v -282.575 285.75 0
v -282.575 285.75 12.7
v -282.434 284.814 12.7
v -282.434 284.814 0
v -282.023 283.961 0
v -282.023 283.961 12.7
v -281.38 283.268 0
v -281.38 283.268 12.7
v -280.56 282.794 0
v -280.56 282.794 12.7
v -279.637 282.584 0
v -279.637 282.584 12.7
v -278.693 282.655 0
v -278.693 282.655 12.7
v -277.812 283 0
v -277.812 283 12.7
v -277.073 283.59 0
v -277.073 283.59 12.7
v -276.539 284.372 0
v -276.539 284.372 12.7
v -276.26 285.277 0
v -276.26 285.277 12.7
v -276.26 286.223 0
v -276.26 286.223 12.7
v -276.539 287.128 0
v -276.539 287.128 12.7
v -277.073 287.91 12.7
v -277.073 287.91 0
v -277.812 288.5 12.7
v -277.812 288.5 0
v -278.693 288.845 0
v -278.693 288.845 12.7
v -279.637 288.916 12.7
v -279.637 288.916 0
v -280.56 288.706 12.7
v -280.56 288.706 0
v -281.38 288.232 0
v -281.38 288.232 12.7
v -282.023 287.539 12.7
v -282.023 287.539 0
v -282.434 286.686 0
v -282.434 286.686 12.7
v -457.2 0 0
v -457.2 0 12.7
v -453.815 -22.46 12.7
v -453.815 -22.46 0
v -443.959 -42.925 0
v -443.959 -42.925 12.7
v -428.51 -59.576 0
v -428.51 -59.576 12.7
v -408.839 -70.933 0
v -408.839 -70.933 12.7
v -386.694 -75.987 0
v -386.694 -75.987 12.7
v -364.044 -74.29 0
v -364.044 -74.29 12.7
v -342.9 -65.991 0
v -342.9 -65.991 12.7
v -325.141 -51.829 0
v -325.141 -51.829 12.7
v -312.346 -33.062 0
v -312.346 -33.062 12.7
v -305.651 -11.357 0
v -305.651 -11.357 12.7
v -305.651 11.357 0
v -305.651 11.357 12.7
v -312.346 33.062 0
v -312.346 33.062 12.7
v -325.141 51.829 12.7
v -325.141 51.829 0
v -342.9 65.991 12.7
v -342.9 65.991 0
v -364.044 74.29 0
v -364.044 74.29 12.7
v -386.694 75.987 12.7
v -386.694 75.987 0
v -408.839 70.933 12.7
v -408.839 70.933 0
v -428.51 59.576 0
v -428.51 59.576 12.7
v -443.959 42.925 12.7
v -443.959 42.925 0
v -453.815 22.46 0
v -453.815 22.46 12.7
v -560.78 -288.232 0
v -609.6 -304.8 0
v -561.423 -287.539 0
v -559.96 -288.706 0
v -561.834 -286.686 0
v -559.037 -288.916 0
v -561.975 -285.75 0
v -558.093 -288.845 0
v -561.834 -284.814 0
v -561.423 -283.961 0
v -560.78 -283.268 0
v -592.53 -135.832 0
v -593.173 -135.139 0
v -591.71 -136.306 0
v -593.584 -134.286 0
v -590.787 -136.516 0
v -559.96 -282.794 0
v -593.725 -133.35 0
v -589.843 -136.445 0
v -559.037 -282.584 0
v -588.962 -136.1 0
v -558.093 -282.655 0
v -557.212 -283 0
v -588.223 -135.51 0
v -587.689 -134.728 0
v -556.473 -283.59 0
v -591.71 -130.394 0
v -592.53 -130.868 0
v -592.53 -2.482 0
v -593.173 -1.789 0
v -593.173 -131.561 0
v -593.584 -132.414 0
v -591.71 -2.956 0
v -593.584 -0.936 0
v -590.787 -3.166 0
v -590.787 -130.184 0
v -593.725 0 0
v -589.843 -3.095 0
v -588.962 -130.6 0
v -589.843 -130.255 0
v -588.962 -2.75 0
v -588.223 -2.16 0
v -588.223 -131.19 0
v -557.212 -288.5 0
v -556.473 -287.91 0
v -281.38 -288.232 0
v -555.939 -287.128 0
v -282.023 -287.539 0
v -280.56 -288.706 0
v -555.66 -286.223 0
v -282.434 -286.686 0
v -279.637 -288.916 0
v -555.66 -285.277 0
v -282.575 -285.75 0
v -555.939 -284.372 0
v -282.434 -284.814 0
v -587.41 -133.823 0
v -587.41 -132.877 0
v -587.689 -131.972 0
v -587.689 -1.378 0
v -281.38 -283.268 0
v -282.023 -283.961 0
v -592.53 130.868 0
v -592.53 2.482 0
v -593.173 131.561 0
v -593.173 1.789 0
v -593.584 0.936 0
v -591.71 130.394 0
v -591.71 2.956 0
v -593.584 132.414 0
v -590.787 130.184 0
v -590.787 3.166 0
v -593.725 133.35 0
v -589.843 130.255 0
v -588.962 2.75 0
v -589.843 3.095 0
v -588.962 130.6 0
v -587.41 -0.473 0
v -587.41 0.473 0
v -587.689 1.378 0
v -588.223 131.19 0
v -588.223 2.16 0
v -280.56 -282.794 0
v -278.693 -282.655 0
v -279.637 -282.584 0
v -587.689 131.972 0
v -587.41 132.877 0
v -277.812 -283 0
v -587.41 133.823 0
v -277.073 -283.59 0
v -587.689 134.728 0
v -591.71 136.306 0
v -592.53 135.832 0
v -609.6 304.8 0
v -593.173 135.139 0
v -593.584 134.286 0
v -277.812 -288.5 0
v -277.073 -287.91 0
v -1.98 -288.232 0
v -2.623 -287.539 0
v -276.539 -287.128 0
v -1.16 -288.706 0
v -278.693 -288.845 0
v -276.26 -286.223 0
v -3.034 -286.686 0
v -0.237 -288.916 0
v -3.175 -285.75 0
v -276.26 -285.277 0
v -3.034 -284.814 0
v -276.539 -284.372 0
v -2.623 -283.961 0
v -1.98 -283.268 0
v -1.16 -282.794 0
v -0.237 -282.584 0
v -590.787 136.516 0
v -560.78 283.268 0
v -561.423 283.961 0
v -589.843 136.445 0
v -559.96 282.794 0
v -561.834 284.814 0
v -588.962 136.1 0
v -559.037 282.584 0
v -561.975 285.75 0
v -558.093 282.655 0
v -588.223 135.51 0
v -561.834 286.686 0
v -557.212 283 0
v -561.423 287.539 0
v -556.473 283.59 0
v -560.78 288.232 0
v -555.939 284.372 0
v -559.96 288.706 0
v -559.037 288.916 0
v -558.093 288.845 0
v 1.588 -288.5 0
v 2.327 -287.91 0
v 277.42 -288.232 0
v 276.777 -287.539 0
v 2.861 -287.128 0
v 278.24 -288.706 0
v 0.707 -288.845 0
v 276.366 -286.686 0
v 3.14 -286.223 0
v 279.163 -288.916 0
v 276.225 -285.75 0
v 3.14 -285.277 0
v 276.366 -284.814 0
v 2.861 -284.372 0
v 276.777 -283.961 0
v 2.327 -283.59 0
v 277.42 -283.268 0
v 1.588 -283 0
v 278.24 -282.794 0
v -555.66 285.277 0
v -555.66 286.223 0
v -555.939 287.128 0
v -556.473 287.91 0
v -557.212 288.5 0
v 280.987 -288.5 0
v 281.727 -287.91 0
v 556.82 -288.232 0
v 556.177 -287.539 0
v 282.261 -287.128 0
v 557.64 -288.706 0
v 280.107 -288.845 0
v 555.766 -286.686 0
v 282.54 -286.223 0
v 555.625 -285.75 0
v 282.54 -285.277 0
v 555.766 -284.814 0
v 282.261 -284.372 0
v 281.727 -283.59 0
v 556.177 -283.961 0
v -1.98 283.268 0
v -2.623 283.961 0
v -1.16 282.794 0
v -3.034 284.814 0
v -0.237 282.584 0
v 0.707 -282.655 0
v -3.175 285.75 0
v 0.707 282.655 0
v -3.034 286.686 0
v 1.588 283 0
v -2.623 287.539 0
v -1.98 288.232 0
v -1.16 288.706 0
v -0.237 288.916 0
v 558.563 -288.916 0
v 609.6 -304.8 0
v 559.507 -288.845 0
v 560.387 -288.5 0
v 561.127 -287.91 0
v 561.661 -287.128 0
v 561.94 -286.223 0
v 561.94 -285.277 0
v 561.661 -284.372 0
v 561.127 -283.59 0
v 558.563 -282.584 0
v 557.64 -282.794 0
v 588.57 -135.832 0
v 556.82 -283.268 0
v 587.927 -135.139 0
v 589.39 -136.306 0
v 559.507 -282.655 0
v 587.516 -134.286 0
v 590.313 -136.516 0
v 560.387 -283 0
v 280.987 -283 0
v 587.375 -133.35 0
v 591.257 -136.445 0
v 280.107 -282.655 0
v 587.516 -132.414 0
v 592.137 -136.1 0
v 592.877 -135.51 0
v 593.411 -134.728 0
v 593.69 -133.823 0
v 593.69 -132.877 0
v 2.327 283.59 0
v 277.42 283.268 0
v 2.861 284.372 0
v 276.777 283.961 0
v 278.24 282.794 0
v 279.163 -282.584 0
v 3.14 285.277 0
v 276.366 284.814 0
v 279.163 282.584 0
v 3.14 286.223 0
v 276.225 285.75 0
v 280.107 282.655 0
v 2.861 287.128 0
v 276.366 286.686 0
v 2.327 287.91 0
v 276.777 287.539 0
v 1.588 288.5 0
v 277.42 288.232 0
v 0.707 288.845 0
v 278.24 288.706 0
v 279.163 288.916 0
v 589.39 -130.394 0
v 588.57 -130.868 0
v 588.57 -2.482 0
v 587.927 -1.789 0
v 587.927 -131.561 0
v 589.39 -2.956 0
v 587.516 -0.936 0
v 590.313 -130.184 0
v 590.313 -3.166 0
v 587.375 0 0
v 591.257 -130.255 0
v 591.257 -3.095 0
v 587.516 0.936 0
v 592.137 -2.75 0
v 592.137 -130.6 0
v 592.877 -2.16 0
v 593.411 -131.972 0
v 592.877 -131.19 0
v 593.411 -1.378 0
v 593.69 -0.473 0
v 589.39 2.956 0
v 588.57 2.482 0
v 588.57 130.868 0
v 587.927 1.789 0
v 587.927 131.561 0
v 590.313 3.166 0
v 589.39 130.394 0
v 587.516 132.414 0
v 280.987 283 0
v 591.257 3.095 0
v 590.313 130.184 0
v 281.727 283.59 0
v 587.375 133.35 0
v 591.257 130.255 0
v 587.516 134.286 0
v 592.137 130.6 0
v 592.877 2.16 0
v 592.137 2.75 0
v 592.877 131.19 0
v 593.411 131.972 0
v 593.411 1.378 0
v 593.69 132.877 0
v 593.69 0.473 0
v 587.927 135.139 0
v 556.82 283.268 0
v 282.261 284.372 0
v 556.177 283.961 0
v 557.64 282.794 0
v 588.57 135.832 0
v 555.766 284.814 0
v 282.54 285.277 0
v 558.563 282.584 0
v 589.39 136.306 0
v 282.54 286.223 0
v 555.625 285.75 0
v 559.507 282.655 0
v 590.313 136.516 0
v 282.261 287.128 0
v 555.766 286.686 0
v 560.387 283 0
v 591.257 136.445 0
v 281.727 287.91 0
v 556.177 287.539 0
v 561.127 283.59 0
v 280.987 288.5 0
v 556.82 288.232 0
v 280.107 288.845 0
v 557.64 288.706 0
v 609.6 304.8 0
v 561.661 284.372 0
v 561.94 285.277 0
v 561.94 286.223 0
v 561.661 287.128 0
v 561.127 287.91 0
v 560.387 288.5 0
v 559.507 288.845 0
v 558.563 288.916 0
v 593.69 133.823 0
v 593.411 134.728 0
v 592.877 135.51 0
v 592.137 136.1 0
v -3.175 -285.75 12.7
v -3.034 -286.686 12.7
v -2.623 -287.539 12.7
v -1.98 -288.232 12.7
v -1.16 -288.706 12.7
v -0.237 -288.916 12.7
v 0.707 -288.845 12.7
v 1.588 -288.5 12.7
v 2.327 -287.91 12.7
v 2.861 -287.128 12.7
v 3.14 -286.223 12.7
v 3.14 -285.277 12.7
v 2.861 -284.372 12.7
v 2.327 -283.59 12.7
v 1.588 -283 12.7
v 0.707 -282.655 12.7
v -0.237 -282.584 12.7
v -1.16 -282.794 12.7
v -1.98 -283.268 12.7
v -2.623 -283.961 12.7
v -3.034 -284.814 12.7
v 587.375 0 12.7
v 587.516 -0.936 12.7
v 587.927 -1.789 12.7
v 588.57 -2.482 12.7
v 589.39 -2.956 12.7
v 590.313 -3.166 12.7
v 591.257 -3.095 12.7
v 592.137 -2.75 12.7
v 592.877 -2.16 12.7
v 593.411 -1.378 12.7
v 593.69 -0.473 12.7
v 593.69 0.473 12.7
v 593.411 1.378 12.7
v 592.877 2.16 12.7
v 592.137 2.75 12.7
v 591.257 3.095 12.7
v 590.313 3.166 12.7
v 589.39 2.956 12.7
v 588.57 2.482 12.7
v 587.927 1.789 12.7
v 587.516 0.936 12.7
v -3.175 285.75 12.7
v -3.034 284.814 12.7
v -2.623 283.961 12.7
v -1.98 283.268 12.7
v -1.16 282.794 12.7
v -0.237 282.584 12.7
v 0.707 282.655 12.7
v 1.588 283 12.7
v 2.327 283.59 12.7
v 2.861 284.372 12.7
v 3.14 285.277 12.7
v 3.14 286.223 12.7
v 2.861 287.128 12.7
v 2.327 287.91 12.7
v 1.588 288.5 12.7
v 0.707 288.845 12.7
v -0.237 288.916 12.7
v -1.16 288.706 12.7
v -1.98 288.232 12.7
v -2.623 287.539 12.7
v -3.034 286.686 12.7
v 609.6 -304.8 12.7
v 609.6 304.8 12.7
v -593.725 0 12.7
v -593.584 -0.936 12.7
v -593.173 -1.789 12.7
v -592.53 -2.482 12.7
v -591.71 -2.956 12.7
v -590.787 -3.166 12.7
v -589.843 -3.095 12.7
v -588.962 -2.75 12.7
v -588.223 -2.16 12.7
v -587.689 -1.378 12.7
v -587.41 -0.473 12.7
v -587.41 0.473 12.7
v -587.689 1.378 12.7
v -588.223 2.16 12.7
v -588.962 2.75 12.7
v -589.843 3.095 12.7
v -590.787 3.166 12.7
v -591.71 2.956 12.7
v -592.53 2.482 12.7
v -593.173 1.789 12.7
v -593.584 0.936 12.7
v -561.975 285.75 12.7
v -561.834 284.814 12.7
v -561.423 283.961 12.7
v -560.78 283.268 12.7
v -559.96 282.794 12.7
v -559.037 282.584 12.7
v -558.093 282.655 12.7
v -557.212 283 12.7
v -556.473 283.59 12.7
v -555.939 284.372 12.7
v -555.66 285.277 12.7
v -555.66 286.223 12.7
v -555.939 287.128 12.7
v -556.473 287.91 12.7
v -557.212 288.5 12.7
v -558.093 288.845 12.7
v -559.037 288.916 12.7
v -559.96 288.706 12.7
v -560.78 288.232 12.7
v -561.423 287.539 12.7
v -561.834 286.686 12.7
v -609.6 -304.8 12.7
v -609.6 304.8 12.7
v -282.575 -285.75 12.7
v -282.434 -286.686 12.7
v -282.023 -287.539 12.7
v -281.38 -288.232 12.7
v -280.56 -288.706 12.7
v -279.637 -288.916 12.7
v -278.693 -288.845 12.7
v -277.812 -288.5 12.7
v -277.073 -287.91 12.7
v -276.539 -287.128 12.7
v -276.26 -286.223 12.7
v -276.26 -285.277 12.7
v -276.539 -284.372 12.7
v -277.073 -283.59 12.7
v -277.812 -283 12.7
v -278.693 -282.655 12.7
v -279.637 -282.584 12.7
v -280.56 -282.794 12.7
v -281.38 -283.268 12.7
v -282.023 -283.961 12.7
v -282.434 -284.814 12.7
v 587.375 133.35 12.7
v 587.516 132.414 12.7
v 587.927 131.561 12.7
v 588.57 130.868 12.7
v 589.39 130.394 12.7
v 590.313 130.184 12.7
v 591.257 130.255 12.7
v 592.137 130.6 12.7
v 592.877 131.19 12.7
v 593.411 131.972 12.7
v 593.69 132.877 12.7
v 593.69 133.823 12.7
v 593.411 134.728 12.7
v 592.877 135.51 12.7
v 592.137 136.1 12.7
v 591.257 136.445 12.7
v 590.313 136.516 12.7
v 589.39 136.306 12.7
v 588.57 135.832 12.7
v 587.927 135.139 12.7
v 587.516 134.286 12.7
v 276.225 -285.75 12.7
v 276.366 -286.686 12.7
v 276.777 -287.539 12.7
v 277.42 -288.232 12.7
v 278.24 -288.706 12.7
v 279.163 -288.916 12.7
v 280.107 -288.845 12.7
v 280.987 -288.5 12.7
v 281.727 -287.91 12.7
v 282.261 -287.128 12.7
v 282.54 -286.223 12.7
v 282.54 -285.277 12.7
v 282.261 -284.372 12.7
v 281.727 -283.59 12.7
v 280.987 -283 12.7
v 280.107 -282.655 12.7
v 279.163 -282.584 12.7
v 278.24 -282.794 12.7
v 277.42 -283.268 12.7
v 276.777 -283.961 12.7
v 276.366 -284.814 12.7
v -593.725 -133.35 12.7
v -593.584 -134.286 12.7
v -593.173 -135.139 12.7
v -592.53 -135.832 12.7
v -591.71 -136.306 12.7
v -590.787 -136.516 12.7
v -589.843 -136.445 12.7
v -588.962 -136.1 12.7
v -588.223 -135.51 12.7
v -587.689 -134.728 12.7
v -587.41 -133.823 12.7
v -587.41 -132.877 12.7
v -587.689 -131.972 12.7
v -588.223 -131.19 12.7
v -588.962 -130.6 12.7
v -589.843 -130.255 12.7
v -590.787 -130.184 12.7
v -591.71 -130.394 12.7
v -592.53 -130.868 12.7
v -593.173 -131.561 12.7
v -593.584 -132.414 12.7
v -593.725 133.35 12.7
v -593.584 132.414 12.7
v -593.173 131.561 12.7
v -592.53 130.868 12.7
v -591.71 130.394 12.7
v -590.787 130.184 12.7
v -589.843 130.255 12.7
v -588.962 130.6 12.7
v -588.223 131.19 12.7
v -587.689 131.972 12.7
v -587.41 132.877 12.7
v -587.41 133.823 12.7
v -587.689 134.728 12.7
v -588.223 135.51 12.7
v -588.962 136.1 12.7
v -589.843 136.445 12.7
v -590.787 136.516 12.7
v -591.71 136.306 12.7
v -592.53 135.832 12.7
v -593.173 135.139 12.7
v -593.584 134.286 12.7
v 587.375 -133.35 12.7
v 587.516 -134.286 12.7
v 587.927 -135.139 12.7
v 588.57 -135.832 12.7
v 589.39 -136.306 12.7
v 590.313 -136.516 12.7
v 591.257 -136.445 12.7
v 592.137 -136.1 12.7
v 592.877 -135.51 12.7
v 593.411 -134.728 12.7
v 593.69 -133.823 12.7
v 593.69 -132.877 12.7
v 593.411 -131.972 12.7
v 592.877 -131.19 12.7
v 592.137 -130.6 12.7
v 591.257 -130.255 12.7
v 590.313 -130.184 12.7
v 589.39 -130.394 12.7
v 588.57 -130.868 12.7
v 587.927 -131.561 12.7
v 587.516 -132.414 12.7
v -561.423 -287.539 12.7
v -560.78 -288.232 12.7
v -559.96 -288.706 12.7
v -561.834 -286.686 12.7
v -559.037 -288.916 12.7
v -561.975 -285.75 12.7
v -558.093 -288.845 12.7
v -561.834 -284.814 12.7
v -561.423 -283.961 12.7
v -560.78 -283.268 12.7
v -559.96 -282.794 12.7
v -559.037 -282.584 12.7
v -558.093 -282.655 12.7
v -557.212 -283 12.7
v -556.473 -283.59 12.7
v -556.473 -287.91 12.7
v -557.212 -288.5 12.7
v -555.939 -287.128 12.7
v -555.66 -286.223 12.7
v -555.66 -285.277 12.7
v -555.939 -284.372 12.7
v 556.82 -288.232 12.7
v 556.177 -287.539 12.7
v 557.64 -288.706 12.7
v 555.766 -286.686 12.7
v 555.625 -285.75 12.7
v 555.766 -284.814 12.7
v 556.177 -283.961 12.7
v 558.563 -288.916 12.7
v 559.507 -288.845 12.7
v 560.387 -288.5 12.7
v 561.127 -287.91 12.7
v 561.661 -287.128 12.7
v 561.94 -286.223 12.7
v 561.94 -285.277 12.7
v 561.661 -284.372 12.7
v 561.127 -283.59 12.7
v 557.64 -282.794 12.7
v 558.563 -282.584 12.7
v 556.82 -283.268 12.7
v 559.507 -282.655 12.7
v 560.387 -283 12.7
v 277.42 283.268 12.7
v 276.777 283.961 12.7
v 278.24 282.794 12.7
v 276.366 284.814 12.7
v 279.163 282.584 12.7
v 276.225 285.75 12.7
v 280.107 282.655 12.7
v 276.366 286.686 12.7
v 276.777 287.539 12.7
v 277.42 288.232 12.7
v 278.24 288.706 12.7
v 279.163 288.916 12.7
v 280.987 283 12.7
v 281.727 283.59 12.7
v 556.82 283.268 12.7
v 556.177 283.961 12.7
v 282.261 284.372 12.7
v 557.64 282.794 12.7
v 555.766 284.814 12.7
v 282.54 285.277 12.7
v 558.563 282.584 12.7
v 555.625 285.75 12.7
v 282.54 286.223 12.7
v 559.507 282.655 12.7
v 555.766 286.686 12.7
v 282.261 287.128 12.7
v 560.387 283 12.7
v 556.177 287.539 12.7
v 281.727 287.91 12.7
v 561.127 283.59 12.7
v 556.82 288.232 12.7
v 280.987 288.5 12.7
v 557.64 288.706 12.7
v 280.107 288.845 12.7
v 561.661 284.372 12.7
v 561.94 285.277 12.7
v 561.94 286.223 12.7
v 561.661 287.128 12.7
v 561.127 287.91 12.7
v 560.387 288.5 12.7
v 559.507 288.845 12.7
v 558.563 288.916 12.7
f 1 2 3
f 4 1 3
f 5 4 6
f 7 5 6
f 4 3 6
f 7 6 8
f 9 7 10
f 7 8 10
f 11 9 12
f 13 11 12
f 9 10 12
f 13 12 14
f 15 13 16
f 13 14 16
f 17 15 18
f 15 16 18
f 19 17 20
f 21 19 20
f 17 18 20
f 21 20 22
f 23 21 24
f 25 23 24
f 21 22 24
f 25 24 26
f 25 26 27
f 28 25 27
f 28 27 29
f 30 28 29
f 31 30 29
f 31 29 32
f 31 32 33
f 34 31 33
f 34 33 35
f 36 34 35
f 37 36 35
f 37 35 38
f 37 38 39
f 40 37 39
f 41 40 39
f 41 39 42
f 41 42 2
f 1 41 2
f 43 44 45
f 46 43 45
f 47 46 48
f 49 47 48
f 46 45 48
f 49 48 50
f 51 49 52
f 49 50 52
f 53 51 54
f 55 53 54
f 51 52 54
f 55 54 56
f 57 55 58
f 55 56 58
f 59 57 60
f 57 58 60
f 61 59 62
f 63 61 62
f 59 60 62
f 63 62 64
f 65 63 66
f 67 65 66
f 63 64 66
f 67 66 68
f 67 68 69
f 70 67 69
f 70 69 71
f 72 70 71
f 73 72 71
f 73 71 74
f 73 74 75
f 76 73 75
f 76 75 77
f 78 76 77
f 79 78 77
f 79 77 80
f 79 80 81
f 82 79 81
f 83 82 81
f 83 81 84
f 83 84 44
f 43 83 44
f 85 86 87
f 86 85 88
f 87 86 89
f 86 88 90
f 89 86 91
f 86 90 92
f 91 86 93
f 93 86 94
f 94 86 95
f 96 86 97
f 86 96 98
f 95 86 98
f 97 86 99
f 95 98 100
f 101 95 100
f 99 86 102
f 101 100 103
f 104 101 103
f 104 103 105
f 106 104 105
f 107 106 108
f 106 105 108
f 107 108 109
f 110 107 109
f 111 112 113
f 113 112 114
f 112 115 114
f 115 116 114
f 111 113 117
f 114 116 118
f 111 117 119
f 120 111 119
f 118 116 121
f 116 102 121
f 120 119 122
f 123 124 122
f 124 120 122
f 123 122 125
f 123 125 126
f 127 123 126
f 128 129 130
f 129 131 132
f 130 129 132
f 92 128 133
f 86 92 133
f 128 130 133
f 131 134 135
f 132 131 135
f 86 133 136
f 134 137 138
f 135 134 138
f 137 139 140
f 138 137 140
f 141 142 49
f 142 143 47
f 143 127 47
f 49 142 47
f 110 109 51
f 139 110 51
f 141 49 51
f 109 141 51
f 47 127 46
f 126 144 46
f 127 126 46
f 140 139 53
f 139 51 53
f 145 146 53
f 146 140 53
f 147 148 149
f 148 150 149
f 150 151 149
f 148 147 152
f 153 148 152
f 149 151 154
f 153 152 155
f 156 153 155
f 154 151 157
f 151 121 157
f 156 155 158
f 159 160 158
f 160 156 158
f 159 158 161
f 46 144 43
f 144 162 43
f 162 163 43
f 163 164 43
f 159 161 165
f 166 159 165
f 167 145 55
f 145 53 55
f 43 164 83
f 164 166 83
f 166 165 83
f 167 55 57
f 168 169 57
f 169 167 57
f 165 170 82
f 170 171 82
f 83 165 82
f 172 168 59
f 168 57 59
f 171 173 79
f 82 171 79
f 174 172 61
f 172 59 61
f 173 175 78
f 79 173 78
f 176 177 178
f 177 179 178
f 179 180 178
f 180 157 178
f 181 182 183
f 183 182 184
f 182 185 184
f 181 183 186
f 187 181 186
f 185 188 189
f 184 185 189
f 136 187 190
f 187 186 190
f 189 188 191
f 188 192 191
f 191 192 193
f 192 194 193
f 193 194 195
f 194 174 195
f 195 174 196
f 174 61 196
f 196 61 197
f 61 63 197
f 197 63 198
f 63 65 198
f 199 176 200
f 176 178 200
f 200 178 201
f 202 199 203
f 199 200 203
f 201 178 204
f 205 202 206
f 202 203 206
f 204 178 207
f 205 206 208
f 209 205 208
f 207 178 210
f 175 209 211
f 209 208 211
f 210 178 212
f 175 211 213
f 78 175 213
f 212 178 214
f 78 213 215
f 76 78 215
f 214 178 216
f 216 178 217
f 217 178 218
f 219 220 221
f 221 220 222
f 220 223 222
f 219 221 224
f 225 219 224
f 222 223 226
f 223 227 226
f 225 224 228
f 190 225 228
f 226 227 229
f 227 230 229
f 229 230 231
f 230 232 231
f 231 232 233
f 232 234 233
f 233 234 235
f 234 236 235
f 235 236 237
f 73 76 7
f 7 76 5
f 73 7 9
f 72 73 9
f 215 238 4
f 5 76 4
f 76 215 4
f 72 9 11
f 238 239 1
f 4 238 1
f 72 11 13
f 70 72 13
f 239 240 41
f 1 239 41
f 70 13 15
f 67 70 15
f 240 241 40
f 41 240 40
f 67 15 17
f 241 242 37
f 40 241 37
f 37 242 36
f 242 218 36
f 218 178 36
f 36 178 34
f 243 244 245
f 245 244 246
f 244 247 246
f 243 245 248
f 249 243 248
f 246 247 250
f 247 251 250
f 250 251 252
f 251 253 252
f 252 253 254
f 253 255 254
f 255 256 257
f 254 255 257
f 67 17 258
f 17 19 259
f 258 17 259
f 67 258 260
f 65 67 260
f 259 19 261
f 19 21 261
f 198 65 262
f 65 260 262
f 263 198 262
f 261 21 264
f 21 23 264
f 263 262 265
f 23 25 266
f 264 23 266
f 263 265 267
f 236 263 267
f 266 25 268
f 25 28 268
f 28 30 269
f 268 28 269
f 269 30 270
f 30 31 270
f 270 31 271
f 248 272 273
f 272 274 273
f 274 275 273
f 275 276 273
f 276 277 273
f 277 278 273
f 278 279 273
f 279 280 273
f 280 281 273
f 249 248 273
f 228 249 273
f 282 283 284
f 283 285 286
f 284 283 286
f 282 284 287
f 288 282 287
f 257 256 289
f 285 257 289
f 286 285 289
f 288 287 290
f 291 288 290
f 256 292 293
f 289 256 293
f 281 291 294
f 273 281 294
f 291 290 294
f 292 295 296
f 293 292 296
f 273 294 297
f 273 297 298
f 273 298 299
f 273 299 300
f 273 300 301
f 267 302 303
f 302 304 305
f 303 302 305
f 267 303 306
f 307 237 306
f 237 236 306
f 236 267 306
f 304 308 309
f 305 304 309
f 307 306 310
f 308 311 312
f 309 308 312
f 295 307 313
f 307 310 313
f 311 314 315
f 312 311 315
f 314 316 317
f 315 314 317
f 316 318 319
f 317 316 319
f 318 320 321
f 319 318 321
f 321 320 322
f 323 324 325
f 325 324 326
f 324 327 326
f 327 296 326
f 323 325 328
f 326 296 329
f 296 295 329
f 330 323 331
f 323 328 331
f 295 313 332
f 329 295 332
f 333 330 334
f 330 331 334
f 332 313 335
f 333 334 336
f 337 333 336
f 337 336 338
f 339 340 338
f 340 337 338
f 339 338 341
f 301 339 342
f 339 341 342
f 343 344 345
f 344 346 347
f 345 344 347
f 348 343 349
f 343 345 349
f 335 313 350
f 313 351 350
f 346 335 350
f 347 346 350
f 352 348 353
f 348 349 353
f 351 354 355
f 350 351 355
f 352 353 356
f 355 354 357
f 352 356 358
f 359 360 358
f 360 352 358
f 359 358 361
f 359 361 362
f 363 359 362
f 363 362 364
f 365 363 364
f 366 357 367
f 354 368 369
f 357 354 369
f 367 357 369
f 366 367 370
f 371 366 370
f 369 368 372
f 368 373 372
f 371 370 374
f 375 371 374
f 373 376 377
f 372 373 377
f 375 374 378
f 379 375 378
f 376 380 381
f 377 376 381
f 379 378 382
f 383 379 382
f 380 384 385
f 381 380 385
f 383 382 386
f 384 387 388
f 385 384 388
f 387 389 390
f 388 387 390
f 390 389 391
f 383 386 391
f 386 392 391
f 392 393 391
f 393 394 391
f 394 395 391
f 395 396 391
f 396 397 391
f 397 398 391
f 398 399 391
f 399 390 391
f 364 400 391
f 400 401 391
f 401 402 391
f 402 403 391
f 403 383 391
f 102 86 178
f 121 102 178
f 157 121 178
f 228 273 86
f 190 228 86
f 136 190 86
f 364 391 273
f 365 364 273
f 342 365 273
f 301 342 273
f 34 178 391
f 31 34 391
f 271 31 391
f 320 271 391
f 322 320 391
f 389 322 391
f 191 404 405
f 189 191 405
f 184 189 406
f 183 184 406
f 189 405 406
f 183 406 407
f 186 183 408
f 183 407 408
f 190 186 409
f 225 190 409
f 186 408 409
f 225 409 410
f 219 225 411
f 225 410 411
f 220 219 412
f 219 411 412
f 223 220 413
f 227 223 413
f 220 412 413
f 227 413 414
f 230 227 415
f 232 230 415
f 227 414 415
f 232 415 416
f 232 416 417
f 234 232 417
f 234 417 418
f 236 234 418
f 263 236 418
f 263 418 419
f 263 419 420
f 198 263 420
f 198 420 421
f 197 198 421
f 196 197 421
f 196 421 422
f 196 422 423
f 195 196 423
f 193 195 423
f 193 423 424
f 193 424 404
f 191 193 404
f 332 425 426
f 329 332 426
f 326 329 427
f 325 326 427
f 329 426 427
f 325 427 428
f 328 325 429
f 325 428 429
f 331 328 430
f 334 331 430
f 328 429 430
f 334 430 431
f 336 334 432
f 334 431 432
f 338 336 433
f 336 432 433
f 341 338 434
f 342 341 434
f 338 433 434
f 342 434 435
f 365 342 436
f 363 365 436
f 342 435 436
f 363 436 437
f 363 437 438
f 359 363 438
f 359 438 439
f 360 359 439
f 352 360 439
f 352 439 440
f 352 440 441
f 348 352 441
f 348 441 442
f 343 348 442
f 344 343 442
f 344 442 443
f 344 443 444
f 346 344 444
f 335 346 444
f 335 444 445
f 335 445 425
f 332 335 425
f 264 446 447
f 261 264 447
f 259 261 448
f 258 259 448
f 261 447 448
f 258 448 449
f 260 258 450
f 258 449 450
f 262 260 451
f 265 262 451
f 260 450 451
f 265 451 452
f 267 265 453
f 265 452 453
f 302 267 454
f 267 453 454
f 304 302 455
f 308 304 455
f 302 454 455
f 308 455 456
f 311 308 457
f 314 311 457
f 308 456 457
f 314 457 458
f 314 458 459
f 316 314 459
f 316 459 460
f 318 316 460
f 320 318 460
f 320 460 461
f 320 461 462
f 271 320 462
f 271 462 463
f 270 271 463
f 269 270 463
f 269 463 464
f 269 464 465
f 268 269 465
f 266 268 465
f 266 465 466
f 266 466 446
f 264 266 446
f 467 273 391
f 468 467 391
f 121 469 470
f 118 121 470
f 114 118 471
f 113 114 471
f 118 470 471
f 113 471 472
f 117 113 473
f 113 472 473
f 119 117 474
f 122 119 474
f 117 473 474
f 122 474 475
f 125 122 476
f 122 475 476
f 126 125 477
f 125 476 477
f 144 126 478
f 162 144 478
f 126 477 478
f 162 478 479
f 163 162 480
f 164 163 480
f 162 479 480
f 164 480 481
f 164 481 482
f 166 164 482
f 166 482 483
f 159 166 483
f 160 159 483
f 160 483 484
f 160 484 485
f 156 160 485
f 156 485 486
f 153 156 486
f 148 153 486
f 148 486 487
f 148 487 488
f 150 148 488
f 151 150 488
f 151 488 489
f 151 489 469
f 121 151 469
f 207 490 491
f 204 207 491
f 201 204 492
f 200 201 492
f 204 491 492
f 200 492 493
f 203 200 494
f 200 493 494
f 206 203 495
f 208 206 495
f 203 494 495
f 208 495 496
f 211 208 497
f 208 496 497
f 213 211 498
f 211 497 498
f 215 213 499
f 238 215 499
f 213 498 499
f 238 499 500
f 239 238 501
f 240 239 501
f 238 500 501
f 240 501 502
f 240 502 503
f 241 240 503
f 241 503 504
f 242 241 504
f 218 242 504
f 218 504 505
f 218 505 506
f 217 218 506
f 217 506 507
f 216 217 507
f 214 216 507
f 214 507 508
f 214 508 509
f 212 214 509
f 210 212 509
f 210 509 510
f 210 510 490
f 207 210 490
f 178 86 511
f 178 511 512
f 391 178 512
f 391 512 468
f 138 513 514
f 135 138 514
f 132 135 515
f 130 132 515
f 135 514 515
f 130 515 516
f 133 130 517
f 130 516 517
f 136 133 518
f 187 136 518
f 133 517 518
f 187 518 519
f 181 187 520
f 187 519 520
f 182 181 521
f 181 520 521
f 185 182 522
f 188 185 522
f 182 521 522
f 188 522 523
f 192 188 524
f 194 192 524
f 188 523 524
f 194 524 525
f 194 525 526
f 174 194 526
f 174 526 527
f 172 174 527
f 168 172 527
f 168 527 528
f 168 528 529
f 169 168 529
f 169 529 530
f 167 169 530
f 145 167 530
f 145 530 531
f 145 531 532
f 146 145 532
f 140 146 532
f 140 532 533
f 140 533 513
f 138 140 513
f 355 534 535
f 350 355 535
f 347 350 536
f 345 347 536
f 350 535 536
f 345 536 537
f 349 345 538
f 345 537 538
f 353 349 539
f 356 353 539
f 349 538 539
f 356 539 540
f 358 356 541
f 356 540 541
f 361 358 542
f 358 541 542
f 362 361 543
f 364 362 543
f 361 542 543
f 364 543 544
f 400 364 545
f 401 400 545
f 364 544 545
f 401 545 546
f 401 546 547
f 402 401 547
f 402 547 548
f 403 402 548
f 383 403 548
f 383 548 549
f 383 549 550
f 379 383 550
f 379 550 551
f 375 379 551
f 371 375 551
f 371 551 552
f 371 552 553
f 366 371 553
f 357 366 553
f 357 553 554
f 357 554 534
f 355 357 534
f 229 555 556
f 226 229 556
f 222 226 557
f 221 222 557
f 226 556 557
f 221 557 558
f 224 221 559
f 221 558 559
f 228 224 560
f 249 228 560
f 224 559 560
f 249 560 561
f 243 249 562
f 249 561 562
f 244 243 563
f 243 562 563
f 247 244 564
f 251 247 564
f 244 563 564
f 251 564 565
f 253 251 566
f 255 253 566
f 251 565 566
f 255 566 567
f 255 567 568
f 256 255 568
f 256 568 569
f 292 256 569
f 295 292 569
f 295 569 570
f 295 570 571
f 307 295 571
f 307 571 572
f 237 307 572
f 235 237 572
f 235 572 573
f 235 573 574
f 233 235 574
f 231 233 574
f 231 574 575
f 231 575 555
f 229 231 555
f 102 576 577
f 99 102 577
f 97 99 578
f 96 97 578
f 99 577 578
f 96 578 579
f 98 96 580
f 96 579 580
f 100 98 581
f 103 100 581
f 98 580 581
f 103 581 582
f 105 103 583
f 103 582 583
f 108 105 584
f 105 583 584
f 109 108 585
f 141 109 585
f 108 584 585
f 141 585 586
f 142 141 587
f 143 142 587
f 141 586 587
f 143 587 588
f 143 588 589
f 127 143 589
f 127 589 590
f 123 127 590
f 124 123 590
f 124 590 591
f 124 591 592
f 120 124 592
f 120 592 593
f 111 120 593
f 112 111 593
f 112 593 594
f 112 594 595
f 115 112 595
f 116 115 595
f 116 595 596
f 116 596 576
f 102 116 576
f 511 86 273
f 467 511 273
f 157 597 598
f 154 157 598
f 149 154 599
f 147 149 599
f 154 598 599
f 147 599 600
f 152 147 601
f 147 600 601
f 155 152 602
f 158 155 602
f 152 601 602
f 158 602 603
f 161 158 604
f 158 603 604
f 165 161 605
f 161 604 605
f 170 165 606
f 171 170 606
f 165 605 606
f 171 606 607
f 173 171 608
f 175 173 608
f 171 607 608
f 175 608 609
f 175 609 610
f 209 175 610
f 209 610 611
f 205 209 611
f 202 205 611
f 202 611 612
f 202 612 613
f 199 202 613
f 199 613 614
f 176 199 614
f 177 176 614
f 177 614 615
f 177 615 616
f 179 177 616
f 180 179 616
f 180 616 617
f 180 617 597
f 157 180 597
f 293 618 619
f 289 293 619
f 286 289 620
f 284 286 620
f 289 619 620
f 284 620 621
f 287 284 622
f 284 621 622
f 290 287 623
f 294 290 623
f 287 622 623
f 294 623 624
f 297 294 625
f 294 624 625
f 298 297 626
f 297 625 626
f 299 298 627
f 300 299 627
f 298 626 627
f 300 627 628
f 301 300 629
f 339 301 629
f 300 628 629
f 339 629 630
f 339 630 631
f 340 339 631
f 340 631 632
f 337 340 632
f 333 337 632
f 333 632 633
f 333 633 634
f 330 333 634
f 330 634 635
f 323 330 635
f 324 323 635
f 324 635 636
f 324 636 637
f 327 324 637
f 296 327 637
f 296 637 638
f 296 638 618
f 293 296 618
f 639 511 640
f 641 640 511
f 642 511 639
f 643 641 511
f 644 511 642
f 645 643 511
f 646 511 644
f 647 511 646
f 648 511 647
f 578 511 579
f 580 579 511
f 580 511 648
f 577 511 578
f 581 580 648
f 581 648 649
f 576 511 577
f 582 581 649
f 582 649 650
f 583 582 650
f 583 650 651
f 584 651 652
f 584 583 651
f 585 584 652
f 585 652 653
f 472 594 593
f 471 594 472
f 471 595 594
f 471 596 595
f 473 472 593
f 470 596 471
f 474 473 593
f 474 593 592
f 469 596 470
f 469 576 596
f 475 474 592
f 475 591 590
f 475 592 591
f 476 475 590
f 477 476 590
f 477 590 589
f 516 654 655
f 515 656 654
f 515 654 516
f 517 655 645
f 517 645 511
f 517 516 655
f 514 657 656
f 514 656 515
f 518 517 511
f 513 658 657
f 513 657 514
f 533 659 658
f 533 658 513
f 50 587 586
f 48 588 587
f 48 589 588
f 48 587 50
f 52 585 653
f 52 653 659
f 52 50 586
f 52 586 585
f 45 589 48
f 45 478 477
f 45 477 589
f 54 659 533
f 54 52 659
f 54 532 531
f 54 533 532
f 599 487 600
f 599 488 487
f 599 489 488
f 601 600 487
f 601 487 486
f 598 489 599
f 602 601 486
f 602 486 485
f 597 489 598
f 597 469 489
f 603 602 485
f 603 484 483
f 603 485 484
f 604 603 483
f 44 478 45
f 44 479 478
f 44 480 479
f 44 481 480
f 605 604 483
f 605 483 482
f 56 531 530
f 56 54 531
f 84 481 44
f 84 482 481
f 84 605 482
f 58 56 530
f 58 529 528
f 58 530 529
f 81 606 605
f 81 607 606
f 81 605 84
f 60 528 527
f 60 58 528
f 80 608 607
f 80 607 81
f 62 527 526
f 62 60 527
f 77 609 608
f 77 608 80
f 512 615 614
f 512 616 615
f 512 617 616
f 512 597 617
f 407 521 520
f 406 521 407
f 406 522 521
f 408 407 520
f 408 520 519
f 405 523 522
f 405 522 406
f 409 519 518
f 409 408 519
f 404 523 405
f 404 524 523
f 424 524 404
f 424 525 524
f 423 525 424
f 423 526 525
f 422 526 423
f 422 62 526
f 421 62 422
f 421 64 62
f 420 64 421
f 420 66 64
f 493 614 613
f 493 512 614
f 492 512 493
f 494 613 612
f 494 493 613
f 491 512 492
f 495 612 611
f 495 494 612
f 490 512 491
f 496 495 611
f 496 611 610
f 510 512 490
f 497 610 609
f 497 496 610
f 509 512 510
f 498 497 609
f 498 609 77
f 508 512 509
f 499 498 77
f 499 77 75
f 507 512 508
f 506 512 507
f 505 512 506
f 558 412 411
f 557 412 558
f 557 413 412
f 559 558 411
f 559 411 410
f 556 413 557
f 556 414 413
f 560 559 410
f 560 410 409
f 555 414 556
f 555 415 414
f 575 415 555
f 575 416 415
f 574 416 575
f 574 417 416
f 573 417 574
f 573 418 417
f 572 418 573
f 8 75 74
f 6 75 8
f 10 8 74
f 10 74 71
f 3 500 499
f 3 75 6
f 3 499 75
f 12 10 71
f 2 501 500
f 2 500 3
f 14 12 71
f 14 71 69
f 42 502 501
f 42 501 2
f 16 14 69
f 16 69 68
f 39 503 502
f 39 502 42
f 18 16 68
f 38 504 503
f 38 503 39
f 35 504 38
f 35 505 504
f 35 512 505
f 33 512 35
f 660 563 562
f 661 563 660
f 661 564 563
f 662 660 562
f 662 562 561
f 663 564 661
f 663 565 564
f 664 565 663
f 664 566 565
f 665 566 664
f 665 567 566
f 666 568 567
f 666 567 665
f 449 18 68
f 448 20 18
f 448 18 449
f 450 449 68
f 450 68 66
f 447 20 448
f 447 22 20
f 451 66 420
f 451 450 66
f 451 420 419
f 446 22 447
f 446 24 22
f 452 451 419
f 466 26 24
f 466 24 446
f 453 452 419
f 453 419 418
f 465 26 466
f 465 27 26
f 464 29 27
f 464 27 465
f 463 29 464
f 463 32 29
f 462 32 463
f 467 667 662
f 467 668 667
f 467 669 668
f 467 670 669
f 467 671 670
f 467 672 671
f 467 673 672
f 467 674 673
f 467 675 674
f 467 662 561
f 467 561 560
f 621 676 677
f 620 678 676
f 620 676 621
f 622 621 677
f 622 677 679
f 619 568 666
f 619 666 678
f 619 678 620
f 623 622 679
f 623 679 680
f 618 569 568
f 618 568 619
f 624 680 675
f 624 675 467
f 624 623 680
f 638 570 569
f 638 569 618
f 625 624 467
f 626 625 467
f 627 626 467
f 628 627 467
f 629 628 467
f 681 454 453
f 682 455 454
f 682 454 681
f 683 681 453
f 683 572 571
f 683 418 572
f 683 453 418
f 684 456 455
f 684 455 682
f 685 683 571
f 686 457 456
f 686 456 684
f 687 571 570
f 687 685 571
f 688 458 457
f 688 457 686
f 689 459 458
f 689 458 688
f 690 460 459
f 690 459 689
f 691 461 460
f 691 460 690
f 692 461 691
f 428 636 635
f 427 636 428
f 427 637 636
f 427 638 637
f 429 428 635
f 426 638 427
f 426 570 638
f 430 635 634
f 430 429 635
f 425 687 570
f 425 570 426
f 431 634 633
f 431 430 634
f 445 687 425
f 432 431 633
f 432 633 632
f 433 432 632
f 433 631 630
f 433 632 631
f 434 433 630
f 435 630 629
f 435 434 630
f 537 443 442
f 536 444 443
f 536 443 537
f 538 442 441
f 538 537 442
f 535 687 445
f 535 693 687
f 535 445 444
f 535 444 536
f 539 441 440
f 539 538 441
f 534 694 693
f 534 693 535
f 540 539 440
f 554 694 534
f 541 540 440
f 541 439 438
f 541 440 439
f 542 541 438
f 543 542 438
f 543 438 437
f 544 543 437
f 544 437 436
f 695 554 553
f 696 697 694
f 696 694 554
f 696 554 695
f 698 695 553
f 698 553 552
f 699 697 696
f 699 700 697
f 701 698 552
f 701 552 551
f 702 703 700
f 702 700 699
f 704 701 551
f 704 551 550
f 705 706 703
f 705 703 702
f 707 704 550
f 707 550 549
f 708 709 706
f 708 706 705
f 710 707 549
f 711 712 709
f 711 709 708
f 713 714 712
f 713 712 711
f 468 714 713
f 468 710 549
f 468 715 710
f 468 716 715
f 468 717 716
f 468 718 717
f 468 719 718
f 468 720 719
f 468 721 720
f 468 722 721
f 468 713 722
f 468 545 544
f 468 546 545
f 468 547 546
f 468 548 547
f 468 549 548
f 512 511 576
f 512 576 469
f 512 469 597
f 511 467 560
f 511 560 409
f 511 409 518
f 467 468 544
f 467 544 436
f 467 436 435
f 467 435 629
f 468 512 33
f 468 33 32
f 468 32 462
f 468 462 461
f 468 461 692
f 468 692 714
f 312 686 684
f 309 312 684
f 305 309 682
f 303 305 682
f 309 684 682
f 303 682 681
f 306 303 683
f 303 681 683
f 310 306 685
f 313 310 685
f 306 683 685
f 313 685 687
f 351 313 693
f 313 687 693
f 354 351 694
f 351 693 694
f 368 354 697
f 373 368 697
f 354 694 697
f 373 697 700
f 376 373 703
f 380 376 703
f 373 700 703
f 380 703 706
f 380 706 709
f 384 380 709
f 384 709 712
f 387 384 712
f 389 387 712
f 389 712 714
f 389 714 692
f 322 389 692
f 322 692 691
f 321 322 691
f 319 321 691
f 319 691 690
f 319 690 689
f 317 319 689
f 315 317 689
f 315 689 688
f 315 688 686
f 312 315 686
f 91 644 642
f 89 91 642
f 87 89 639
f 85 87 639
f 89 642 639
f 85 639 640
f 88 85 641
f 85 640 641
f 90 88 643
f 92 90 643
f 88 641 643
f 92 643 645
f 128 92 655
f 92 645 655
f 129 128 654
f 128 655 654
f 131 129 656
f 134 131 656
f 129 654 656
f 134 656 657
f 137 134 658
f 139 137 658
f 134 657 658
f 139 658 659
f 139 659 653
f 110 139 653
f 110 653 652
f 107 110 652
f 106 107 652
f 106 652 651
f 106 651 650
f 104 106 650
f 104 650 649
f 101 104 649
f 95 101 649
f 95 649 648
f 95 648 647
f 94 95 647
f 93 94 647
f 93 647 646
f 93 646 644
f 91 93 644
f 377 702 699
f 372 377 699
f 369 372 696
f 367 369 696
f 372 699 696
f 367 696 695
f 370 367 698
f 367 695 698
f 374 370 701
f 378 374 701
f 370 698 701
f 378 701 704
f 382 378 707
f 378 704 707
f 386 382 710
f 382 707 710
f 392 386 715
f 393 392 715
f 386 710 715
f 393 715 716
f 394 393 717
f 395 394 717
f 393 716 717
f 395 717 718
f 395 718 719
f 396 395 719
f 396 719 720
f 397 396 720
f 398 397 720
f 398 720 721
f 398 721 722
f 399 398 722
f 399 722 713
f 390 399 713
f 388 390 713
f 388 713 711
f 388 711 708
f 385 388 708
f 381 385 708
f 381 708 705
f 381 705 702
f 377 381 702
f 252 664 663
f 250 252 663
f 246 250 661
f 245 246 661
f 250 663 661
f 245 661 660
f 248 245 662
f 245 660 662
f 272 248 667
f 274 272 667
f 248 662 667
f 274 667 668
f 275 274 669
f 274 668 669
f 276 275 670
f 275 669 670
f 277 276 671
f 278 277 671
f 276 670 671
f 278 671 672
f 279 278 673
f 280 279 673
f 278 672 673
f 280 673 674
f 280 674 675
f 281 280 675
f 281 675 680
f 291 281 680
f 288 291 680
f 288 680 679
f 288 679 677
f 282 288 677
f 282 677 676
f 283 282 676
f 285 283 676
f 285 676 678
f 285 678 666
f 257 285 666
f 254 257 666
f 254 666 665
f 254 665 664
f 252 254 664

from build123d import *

# Parameters (mm, degrees)
F0_W     = 1219.2
F0_H     = 609.6
F1_DEPTH = 12.7
F2_D     = 152.4
F3_D     = 6.35


with BuildPart() as f1:
    # F0 (on Top) → F1 (new body)
    with BuildSketch(Plane.XY):
        Rectangle(F0_W, F0_H)
    extrude(amount=F1_DEPTH)

    # F2 (through all)
    with Locations(Plane(origin=(0, 0, 0), x_dir=(1, 0, 0), z_dir=(0, 0, -1))):
        with Locations((-381, 0)):
            Hole(F2_D / 2)

    # F3 (through all)
    with Locations(Plane(origin=(0, 0, 0), x_dir=(1, 0, 0), z_dir=(0, 0, -1))):
        with Locations((-558.8, 285.75), (-279.4, 285.75), (0, 285.75), (279.4, 285.75), (558.8, 285.75), (558.8, -285.75), (279.4, -285.75), (0, -285.75), (-279.4, -285.75), (-558.8, -285.75), (-590.55, 133.35), (-590.55, 0), (-590.55, -133.35), (590.55, 133.35), (590.55, 0), (590.55, -133.35)):
            Hole(F3_D / 2)


solid = f1.part
